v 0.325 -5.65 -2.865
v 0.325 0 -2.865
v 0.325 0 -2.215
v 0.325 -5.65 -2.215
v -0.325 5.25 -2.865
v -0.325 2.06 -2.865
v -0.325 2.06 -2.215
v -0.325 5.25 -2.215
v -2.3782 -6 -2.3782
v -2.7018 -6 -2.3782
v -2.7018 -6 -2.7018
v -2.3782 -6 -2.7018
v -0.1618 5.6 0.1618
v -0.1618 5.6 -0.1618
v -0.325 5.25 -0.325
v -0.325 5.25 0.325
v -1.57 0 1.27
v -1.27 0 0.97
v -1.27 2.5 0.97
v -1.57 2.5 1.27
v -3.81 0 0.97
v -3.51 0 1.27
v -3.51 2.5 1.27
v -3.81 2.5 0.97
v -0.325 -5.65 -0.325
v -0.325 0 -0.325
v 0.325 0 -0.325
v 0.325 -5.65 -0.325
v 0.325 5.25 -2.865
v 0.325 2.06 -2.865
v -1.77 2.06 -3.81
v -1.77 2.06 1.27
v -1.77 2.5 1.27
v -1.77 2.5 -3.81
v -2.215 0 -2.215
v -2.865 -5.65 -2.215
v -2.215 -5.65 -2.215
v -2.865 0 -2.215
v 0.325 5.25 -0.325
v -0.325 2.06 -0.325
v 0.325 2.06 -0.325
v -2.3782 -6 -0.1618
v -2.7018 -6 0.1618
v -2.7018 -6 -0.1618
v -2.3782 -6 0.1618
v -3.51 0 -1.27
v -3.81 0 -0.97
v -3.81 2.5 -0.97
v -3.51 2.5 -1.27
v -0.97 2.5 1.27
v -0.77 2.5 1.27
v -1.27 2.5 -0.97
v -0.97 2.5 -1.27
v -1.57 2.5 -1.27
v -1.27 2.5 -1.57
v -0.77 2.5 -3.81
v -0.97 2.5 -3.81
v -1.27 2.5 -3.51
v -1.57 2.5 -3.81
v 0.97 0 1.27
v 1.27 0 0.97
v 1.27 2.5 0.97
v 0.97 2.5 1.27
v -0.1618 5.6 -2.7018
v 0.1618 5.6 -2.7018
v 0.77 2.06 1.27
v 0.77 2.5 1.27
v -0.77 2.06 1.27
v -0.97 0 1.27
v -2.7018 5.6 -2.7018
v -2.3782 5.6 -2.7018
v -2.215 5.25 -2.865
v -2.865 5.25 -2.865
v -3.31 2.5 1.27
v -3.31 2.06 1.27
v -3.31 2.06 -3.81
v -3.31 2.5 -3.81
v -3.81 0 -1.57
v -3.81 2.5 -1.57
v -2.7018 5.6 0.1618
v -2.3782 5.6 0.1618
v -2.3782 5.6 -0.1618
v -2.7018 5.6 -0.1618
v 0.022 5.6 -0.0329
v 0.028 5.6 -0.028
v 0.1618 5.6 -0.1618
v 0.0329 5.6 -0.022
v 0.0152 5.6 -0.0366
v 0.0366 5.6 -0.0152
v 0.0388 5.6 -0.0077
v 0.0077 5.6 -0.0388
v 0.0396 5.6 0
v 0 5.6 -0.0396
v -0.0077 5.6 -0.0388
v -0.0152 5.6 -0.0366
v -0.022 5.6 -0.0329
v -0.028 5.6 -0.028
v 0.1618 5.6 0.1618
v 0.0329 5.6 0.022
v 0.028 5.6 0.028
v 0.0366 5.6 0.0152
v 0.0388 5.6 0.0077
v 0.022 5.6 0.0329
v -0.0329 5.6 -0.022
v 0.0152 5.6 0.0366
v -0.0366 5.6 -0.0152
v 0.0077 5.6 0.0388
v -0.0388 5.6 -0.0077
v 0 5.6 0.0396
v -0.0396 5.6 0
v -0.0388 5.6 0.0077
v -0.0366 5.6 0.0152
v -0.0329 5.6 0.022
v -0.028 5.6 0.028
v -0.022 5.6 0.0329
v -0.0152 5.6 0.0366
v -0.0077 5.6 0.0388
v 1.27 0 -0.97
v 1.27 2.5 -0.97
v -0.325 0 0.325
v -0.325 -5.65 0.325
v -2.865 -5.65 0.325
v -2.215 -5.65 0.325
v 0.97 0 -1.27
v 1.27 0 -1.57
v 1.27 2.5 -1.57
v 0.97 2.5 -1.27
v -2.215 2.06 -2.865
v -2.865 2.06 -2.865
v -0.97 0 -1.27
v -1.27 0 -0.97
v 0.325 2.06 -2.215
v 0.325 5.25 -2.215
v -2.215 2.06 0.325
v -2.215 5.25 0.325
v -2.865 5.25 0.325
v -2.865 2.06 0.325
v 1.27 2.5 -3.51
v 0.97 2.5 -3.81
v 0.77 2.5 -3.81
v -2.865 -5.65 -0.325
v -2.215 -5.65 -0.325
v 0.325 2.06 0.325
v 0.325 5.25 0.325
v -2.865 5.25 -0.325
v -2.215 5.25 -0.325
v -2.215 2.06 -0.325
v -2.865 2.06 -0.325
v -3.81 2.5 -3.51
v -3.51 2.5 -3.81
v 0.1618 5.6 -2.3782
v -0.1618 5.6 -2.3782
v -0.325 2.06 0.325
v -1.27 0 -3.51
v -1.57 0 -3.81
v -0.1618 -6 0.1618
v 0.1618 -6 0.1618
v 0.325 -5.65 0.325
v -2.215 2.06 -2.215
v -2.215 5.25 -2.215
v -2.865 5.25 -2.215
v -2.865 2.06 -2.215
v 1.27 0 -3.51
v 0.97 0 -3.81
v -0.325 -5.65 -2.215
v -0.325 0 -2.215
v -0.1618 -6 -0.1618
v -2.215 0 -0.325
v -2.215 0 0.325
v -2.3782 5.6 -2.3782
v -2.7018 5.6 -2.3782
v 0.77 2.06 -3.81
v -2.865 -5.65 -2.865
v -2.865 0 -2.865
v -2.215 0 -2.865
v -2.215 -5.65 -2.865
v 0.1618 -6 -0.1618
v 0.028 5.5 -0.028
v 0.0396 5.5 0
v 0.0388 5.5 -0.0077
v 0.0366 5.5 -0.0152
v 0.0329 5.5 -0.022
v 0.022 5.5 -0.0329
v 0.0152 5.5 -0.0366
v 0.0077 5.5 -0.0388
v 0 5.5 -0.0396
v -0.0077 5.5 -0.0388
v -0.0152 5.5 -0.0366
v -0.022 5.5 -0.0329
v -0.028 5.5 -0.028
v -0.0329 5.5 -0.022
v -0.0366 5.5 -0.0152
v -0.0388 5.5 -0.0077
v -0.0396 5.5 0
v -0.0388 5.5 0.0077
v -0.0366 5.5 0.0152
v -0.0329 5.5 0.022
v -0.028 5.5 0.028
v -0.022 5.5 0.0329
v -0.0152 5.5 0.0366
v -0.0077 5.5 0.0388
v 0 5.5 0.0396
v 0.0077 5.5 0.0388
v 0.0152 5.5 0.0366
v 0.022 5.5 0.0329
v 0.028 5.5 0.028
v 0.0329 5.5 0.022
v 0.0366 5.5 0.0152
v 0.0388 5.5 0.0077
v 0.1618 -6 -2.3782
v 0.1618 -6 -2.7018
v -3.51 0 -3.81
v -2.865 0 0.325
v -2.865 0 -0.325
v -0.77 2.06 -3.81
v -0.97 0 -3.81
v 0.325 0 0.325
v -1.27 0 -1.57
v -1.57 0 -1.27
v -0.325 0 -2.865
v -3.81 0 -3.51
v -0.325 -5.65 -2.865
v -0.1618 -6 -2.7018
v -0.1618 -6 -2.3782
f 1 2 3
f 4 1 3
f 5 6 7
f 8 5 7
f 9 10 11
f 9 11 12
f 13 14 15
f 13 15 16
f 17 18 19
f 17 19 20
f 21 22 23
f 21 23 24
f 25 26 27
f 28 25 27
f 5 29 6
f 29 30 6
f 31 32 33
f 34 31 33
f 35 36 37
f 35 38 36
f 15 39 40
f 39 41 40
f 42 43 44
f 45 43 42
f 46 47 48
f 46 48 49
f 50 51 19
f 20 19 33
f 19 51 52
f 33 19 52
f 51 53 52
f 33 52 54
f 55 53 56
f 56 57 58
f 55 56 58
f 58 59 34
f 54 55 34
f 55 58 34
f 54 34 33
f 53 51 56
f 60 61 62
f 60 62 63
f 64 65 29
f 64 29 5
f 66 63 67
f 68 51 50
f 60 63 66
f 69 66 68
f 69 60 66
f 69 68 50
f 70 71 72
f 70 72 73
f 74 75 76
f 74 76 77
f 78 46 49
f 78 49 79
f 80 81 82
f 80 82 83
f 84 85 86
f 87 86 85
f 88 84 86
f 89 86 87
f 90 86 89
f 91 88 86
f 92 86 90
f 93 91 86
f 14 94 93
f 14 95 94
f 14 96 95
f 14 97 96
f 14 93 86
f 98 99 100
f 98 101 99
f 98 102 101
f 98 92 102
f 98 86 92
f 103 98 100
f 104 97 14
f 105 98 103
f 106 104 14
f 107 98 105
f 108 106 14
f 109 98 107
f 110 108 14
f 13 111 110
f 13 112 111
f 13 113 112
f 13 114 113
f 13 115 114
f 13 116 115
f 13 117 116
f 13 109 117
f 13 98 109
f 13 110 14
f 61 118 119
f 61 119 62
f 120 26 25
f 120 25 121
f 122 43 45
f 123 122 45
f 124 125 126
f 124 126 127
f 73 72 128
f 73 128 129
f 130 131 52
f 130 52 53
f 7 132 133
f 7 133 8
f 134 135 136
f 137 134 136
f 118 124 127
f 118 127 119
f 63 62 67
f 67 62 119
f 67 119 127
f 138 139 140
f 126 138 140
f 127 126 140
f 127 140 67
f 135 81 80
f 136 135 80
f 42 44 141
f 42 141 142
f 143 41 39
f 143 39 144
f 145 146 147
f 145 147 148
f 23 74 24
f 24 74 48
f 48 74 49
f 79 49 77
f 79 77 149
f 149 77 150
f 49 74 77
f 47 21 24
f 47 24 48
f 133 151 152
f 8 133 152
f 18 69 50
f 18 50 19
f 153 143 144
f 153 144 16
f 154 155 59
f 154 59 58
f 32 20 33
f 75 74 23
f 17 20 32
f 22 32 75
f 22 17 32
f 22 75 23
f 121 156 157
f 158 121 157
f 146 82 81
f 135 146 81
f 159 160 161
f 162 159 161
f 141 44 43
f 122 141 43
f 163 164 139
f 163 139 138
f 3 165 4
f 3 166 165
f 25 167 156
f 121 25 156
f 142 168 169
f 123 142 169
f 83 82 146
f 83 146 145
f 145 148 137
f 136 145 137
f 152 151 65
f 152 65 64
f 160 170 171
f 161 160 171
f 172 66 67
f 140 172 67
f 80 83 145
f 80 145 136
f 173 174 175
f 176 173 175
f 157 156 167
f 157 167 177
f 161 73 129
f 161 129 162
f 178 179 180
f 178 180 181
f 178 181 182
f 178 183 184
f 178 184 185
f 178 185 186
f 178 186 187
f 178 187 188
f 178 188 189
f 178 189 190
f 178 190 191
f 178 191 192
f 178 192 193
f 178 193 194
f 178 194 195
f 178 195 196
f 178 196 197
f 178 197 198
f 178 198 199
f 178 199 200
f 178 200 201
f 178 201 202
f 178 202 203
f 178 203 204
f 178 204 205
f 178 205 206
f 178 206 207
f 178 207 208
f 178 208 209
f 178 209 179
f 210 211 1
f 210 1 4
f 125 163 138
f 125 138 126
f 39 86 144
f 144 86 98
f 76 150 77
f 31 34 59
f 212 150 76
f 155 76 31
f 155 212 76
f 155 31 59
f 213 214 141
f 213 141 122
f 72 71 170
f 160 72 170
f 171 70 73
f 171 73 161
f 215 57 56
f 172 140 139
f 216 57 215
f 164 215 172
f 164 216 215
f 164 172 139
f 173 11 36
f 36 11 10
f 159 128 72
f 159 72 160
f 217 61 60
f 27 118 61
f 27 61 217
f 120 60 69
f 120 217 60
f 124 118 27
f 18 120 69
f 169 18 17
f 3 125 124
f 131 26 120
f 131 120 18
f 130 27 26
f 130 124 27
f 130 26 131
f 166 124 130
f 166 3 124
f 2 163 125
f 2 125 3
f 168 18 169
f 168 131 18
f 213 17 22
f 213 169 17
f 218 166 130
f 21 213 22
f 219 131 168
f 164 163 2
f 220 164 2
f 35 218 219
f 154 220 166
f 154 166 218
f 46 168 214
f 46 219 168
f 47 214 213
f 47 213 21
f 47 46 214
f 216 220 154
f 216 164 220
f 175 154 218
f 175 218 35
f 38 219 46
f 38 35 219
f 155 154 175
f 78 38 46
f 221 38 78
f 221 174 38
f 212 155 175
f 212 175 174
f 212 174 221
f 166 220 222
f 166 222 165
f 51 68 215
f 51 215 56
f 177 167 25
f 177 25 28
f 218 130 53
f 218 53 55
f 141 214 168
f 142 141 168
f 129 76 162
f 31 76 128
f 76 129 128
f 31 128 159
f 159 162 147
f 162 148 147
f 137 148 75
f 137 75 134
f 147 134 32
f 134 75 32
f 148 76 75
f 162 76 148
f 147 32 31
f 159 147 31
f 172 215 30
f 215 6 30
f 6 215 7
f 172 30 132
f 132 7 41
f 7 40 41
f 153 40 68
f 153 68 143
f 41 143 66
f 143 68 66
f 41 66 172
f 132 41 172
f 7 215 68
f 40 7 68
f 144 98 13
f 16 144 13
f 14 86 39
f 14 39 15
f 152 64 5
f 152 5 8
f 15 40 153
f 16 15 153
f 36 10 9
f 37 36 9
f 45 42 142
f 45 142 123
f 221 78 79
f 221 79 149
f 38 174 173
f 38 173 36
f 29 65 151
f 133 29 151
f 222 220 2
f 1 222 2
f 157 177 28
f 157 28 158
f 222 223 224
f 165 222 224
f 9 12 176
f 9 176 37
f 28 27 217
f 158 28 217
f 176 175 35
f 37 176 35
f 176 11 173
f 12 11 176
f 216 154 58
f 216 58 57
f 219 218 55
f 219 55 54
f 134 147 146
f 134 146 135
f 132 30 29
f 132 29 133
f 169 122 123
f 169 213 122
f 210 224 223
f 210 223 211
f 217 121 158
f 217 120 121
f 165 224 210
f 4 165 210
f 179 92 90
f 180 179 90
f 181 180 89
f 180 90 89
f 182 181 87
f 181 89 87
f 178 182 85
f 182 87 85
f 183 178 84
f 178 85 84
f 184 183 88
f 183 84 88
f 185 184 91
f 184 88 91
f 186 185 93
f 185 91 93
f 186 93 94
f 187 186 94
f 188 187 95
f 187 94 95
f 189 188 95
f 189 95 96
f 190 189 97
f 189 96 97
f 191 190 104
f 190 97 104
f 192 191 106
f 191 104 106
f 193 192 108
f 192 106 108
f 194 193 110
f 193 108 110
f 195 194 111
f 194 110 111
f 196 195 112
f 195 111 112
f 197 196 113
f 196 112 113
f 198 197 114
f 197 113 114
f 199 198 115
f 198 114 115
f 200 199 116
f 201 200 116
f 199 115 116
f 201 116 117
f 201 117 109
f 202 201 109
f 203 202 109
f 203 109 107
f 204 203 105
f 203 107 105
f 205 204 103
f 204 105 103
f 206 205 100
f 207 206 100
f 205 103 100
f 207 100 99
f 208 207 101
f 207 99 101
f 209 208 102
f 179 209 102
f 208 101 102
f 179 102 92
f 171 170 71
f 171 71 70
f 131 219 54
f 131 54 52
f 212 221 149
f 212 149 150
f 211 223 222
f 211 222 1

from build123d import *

# Parameters (mm, degrees)
EXTRUDE1_DEPTH                     = 2.5
SKETCH2_W                          = 1.54
SKETCH2_H                          = 0.508742985
CUT_EXTRUDE1_DEPTH                 = 12.5
SKETCH3_W                          = 0.65
SKETCH3_H                          = 0.65
EXTRUDE2_DEPTH                     = 3.54
CHAMFER1_SIZE                      = 0.35
CHAMFER1_SIZE2                     = 0.16320768
CHAMFER1_PART_2_SIZE               = 0.35
CHAMFER1_PART_2_SIZE2              = 0.16320768
CHAMFER1_PART_3_SIZE               = 0.35
CHAMFER1_PART_3_SIZE2              = 0.16320768
CHAMFER1_PART_4_SIZE               = 0.35
CHAMFER1_PART_4_SIZE2              = 0.16320768
SKETCH4_W                          = 0.65
SKETCH4_H                          = 0.65
EXTRUDE3_DEPTH                     = 6
CHAMFER2_SIZE                      = 0.35
CHAMFER2_SIZE2                     = 0.16320768
CHAMFER2_PART_2_SIZE               = 0.35
CHAMFER2_PART_2_SIZE2              = 0.16320768
CHAMFER2_PART_3_SIZE               = 0.35
CHAMFER2_PART_3_SIZE2              = 0.16320768
CHAMFER2_PART_4_SIZE               = 0.35
CHAMFER2_PART_4_SIZE2              = 0.16320768
LPATTERN3_COUNT                    = 2
LPATTERN3_PITCH                    = 2.54
LPATTERN3_COUNT_DIR2               = 2
LPATTERN3_PITCH_DIR2               = 2.54
LPATTERN4_COUNT                    = 2
LPATTERN4_PITCH                    = 2.54
LPATTERN4_COUNT_DIR2               = 2
LPATTERN4_PITCH_DIR2               = 2.54
CHAMFER1_OF_LPATTERN4_SIZE2        = 0.16320768
CHAMFER1_OF_LPATTERN4_SIZE         = 0.35
CHAMFER1_PART_2_OF_LPATTERN4_SIZE2 = 0.16320768
CHAMFER1_PART_2_OF_LPATTERN4_SIZE  = 0.35
CHAMFER1_PART_3_OF_LPATTERN4_SIZE2 = 0.16320768
CHAMFER1_PART_3_OF_LPATTERN4_SIZE  = 0.35
CHAMFER1_PART_4_OF_LPATTERN4_SIZE2 = 0.16320768
CHAMFER1_PART_4_OF_LPATTERN4_SIZE  = 0.35
CHAMFER2_OF_LPATTERN4_SIZE2        = 0.16320768
CHAMFER2_OF_LPATTERN4_SIZE         = 0.35
CHAMFER2_PART_2_OF_LPATTERN4_SIZE2 = 0.16320768
CHAMFER2_PART_2_OF_LPATTERN4_SIZE  = 0.35
CHAMFER2_PART_3_OF_LPATTERN4_SIZE2 = 0.16320768
CHAMFER2_PART_3_OF_LPATTERN4_SIZE  = 0.35
CHAMFER2_PART_4_OF_LPATTERN4_SIZE2 = 0.16320768
CHAMFER2_PART_4_OF_LPATTERN4_SIZE  = 0.35
ESBO_O1_R                          = 0.039608668
CORTE_EXTRUS_O1_DEPTH              = 0.1


with BuildPart() as part:
    # Sketch1 → Extrude1 (new body)
    with BuildSketch(Plane(origin=(0, 0, 0), x_dir=(1, 0, 0), z_dir=(0, 1, 0))):
        Polygon((-0.97, 1.27), (0.97, 1.27), (1.27, 0.97), (1.27, -0.97), (0.97, -1.27), (-0.97, -1.27), (-1.27, -0.97), (-1.27, 0.97), align=None)
    extrude1 = extrude(amount=EXTRUDE1_DEPTH)

    # Sketch2 → Cut-Extrude1 (cut)
    with BuildSketch(Plane.XY.offset(1.27)):
        with Locations((0, 2.314371493)):
            Rectangle(SKETCH2_W, SKETCH2_H)
    cut_extrude1 = extrude(amount=-CUT_EXTRUDE1_DEPTH, mode=Mode.SUBTRACT)

    # Sketch3 → Extrude2 (add)
    with BuildSketch(Plane(origin=(0, 2.06, 0), x_dir=(-1, 0, 0), z_dir=(0, 1, 0))):
        Rectangle(SKETCH3_W, SKETCH3_H)
    extrude2 = extrude(amount=EXTRUDE2_DEPTH)

    # Chamfer1
    chamfer1_edges = [part.edges().sort_by_distance(p)[0] for p in [
        (-0.325, 5.6, 0),
    ]]
    chamfer1_side = [part.faces().sort_by_distance(p)[0] for p in [
        (-0.325, 3.83, 0),
    ]]
    chamfer(chamfer1_edges, length=CHAMFER1_SIZE, length2=CHAMFER1_SIZE2, reference=chamfer1_side[0])

    # Chamfer1 part 2
    chamfer1_part_2_edges = [part.edges().sort_by_distance(p)[0] for p in [
        (0, 5.6, 0.325),
    ]]
    chamfer1_part_2_side = [part.faces().sort_by_distance(p)[0] for p in [
        (0, 3.83, 0.325),
    ]]
    chamfer(chamfer1_part_2_edges, length=CHAMFER1_PART_2_SIZE, length2=CHAMFER1_PART_2_SIZE2, reference=chamfer1_part_2_side[0])

    # Chamfer1 part 3
    chamfer1_part_3_edges = [part.edges().sort_by_distance(p)[0] for p in [
        (0.325, 5.6, 0),
    ]]
    chamfer1_part_3_side = [part.faces().sort_by_distance(p)[0] for p in [
        (0.325, 3.83, 0),
    ]]
    chamfer(chamfer1_part_3_edges, length=CHAMFER1_PART_3_SIZE, length2=CHAMFER1_PART_3_SIZE2, reference=chamfer1_part_3_side[0])

    # Chamfer1 part 4
    chamfer1_part_4_edges = [part.edges().sort_by_distance(p)[0] for p in [
        (0, 5.6, -0.325),
    ]]
    chamfer1_part_4_side = [part.faces().sort_by_distance(p)[0] for p in [
        (0, 3.83, -0.325),
    ]]
    chamfer(chamfer1_part_4_edges, length=CHAMFER1_PART_4_SIZE, length2=CHAMFER1_PART_4_SIZE2, reference=chamfer1_part_4_side[0])

    # Sketch4 → Extrude3 (add)
    with BuildSketch(Plane.XZ):
        Rectangle(SKETCH4_W, SKETCH4_H)
    extrude3 = extrude(amount=EXTRUDE3_DEPTH)

    # Chamfer2
    chamfer2_edges = [part.edges().sort_by_distance(p)[0] for p in [
        (-0.325, -6, 0),
    ]]
    chamfer2_side = [part.faces().sort_by_distance(p)[0] for p in [
        (-0.325, -3, 0),
    ]]
    chamfer(chamfer2_edges, length=CHAMFER2_SIZE, length2=CHAMFER2_SIZE2, reference=chamfer2_side[0])

    # Chamfer2 part 2
    chamfer2_part_2_edges = [part.edges().sort_by_distance(p)[0] for p in [
        (0, -6, -0.325),
    ]]
    chamfer2_part_2_side = [part.faces().sort_by_distance(p)[0] for p in [
        (0, -3, -0.325),
    ]]
    chamfer(chamfer2_part_2_edges, length=CHAMFER2_PART_2_SIZE, length2=CHAMFER2_PART_2_SIZE2, reference=chamfer2_part_2_side[0])

    # Chamfer2 part 3
    chamfer2_part_3_edges = [part.edges().sort_by_distance(p)[0] for p in [
        (0.325, -6, 0),
    ]]
    chamfer2_part_3_side = [part.faces().sort_by_distance(p)[0] for p in [
        (0.325, -3, 0),
    ]]
    chamfer(chamfer2_part_3_edges, length=CHAMFER2_PART_3_SIZE, length2=CHAMFER2_PART_3_SIZE2, reference=chamfer2_part_3_side[0])

    # Chamfer2 part 4
    chamfer2_part_4_edges = [part.edges().sort_by_distance(p)[0] for p in [
        (0, -6, 0.325),
    ]]
    chamfer2_part_4_side = [part.faces().sort_by_distance(p)[0] for p in [
        (0, -3, 0.325),
    ]]
    chamfer(chamfer2_part_4_edges, length=CHAMFER2_PART_4_SIZE, length2=CHAMFER2_PART_4_SIZE2, reference=chamfer2_part_4_side[0])

    # LPattern3: Extrude1, Cut-Extrude1 2 × 2
    with Locations(*[(-j * LPATTERN3_PITCH_DIR2, 0, -i * LPATTERN3_PITCH) for i in range(LPATTERN3_COUNT) for j in range(LPATTERN3_COUNT_DIR2) if (i, j) != (0, 0)]):
        add(extrude1)
        add(cut_extrude1, mode=Mode.SUBTRACT)

    # LPattern4: Extrude2, Extrude3 2 × 2
    with Locations(*[(-j * LPATTERN4_PITCH_DIR2, 0, -i * LPATTERN4_PITCH) for i in range(LPATTERN4_COUNT) for j in range(LPATTERN4_COUNT_DIR2) if (i, j) != (0, 0)]):
        add(extrude2)
        add(extrude3)

    # Chamfer1 of LPattern4
    chamfer1_of_lpattern4_edges = [part.edges().sort_by_distance(p)[0] for p in [
        (-2.865, 5.6, 0),
        (-0.325, 5.6, -2.54),
        (-2.865, 5.6, -2.54),
    ]]
    chamfer(chamfer1_of_lpattern4_edges, length=CHAMFER1_OF_LPATTERN4_SIZE, length2=CHAMFER1_OF_LPATTERN4_SIZE2)

    # Chamfer1 part 2 of LPattern4
    chamfer1_part_2_of_lpattern4_edges = [part.edges().sort_by_distance(p)[0] for p in [
        (-2.54, 5.6, 0.325),
        (0, 5.6, -2.215),
        (-2.54, 5.6, -2.215),
    ]]
    chamfer(chamfer1_part_2_of_lpattern4_edges, length=CHAMFER1_PART_2_OF_LPATTERN4_SIZE, length2=CHAMFER1_PART_2_OF_LPATTERN4_SIZE2)

    # Chamfer1 part 3 of LPattern4
    chamfer1_part_3_of_lpattern4_edges = [part.edges().sort_by_distance(p)[0] for p in [
        (-2.215, 5.6, 0),
        (0.325, 5.6, -2.54),
        (-2.215, 5.6, -2.54),
    ]]
    chamfer(chamfer1_part_3_of_lpattern4_edges, length=CHAMFER1_PART_3_OF_LPATTERN4_SIZE, length2=CHAMFER1_PART_3_OF_LPATTERN4_SIZE2)

    # Chamfer1 part 4 of LPattern4
    chamfer1_part_4_of_lpattern4_edges = [part.edges().sort_by_distance(p)[0] for p in [
        (-2.54, 5.6, -0.325),
        (0, 5.6, -2.865),
        (-2.54, 5.6, -2.865),
    ]]
    chamfer(chamfer1_part_4_of_lpattern4_edges, length=CHAMFER1_PART_4_OF_LPATTERN4_SIZE, length2=CHAMFER1_PART_4_OF_LPATTERN4_SIZE2)

    # Chamfer2 of LPattern4
    chamfer2_of_lpattern4_edges = [part.edges().sort_by_distance(p)[0] for p in [
        (-2.865, -6, 0),
        (-0.325, -6, -2.54),
        (-2.865, -6, -2.54),
    ]]
    chamfer(chamfer2_of_lpattern4_edges, length=CHAMFER2_OF_LPATTERN4_SIZE, length2=CHAMFER2_OF_LPATTERN4_SIZE2)

    # Chamfer2 part 2 of LPattern4
    chamfer2_part_2_of_lpattern4_edges = [part.edges().sort_by_distance(p)[0] for p in [
        (-2.54, -6, -0.325),
        (0, -6, -2.865),
        (-2.54, -6, -2.865),
    ]]
    chamfer(chamfer2_part_2_of_lpattern4_edges, length=CHAMFER2_PART_2_OF_LPATTERN4_SIZE, length2=CHAMFER2_PART_2_OF_LPATTERN4_SIZE2)

    # Chamfer2 part 3 of LPattern4
    chamfer2_part_3_of_lpattern4_edges = [part.edges().sort_by_distance(p)[0] for p in [
        (-2.215, -6, 0),
        (0.325, -6, -2.54),
        (-2.215, -6, -2.54),
    ]]
    chamfer(chamfer2_part_3_of_lpattern4_edges, length=CHAMFER2_PART_3_OF_LPATTERN4_SIZE, length2=CHAMFER2_PART_3_OF_LPATTERN4_SIZE2)

    # Chamfer2 part 4 of LPattern4
    chamfer2_part_4_of_lpattern4_edges = [part.edges().sort_by_distance(p)[0] for p in [
        (-2.54, -6, 0.325),
        (0, -6, -2.215),
        (-2.54, -6, -2.215),
    ]]
    chamfer(chamfer2_part_4_of_lpattern4_edges, length=CHAMFER2_PART_4_OF_LPATTERN4_SIZE, length2=CHAMFER2_PART_4_OF_LPATTERN4_SIZE2)

    # Esboço1 → Corte-extrusão1 (cut)
    with BuildSketch(Plane(origin=(0, 5.6, 0), x_dir=(1, 0, 0), z_dir=(0, 1, 0))):
        Circle(ESBO_O1_R)
    extrude(amount=-CORTE_EXTRUS_O1_DEPTH, mode=Mode.SUBTRACT)


solid = part.part
